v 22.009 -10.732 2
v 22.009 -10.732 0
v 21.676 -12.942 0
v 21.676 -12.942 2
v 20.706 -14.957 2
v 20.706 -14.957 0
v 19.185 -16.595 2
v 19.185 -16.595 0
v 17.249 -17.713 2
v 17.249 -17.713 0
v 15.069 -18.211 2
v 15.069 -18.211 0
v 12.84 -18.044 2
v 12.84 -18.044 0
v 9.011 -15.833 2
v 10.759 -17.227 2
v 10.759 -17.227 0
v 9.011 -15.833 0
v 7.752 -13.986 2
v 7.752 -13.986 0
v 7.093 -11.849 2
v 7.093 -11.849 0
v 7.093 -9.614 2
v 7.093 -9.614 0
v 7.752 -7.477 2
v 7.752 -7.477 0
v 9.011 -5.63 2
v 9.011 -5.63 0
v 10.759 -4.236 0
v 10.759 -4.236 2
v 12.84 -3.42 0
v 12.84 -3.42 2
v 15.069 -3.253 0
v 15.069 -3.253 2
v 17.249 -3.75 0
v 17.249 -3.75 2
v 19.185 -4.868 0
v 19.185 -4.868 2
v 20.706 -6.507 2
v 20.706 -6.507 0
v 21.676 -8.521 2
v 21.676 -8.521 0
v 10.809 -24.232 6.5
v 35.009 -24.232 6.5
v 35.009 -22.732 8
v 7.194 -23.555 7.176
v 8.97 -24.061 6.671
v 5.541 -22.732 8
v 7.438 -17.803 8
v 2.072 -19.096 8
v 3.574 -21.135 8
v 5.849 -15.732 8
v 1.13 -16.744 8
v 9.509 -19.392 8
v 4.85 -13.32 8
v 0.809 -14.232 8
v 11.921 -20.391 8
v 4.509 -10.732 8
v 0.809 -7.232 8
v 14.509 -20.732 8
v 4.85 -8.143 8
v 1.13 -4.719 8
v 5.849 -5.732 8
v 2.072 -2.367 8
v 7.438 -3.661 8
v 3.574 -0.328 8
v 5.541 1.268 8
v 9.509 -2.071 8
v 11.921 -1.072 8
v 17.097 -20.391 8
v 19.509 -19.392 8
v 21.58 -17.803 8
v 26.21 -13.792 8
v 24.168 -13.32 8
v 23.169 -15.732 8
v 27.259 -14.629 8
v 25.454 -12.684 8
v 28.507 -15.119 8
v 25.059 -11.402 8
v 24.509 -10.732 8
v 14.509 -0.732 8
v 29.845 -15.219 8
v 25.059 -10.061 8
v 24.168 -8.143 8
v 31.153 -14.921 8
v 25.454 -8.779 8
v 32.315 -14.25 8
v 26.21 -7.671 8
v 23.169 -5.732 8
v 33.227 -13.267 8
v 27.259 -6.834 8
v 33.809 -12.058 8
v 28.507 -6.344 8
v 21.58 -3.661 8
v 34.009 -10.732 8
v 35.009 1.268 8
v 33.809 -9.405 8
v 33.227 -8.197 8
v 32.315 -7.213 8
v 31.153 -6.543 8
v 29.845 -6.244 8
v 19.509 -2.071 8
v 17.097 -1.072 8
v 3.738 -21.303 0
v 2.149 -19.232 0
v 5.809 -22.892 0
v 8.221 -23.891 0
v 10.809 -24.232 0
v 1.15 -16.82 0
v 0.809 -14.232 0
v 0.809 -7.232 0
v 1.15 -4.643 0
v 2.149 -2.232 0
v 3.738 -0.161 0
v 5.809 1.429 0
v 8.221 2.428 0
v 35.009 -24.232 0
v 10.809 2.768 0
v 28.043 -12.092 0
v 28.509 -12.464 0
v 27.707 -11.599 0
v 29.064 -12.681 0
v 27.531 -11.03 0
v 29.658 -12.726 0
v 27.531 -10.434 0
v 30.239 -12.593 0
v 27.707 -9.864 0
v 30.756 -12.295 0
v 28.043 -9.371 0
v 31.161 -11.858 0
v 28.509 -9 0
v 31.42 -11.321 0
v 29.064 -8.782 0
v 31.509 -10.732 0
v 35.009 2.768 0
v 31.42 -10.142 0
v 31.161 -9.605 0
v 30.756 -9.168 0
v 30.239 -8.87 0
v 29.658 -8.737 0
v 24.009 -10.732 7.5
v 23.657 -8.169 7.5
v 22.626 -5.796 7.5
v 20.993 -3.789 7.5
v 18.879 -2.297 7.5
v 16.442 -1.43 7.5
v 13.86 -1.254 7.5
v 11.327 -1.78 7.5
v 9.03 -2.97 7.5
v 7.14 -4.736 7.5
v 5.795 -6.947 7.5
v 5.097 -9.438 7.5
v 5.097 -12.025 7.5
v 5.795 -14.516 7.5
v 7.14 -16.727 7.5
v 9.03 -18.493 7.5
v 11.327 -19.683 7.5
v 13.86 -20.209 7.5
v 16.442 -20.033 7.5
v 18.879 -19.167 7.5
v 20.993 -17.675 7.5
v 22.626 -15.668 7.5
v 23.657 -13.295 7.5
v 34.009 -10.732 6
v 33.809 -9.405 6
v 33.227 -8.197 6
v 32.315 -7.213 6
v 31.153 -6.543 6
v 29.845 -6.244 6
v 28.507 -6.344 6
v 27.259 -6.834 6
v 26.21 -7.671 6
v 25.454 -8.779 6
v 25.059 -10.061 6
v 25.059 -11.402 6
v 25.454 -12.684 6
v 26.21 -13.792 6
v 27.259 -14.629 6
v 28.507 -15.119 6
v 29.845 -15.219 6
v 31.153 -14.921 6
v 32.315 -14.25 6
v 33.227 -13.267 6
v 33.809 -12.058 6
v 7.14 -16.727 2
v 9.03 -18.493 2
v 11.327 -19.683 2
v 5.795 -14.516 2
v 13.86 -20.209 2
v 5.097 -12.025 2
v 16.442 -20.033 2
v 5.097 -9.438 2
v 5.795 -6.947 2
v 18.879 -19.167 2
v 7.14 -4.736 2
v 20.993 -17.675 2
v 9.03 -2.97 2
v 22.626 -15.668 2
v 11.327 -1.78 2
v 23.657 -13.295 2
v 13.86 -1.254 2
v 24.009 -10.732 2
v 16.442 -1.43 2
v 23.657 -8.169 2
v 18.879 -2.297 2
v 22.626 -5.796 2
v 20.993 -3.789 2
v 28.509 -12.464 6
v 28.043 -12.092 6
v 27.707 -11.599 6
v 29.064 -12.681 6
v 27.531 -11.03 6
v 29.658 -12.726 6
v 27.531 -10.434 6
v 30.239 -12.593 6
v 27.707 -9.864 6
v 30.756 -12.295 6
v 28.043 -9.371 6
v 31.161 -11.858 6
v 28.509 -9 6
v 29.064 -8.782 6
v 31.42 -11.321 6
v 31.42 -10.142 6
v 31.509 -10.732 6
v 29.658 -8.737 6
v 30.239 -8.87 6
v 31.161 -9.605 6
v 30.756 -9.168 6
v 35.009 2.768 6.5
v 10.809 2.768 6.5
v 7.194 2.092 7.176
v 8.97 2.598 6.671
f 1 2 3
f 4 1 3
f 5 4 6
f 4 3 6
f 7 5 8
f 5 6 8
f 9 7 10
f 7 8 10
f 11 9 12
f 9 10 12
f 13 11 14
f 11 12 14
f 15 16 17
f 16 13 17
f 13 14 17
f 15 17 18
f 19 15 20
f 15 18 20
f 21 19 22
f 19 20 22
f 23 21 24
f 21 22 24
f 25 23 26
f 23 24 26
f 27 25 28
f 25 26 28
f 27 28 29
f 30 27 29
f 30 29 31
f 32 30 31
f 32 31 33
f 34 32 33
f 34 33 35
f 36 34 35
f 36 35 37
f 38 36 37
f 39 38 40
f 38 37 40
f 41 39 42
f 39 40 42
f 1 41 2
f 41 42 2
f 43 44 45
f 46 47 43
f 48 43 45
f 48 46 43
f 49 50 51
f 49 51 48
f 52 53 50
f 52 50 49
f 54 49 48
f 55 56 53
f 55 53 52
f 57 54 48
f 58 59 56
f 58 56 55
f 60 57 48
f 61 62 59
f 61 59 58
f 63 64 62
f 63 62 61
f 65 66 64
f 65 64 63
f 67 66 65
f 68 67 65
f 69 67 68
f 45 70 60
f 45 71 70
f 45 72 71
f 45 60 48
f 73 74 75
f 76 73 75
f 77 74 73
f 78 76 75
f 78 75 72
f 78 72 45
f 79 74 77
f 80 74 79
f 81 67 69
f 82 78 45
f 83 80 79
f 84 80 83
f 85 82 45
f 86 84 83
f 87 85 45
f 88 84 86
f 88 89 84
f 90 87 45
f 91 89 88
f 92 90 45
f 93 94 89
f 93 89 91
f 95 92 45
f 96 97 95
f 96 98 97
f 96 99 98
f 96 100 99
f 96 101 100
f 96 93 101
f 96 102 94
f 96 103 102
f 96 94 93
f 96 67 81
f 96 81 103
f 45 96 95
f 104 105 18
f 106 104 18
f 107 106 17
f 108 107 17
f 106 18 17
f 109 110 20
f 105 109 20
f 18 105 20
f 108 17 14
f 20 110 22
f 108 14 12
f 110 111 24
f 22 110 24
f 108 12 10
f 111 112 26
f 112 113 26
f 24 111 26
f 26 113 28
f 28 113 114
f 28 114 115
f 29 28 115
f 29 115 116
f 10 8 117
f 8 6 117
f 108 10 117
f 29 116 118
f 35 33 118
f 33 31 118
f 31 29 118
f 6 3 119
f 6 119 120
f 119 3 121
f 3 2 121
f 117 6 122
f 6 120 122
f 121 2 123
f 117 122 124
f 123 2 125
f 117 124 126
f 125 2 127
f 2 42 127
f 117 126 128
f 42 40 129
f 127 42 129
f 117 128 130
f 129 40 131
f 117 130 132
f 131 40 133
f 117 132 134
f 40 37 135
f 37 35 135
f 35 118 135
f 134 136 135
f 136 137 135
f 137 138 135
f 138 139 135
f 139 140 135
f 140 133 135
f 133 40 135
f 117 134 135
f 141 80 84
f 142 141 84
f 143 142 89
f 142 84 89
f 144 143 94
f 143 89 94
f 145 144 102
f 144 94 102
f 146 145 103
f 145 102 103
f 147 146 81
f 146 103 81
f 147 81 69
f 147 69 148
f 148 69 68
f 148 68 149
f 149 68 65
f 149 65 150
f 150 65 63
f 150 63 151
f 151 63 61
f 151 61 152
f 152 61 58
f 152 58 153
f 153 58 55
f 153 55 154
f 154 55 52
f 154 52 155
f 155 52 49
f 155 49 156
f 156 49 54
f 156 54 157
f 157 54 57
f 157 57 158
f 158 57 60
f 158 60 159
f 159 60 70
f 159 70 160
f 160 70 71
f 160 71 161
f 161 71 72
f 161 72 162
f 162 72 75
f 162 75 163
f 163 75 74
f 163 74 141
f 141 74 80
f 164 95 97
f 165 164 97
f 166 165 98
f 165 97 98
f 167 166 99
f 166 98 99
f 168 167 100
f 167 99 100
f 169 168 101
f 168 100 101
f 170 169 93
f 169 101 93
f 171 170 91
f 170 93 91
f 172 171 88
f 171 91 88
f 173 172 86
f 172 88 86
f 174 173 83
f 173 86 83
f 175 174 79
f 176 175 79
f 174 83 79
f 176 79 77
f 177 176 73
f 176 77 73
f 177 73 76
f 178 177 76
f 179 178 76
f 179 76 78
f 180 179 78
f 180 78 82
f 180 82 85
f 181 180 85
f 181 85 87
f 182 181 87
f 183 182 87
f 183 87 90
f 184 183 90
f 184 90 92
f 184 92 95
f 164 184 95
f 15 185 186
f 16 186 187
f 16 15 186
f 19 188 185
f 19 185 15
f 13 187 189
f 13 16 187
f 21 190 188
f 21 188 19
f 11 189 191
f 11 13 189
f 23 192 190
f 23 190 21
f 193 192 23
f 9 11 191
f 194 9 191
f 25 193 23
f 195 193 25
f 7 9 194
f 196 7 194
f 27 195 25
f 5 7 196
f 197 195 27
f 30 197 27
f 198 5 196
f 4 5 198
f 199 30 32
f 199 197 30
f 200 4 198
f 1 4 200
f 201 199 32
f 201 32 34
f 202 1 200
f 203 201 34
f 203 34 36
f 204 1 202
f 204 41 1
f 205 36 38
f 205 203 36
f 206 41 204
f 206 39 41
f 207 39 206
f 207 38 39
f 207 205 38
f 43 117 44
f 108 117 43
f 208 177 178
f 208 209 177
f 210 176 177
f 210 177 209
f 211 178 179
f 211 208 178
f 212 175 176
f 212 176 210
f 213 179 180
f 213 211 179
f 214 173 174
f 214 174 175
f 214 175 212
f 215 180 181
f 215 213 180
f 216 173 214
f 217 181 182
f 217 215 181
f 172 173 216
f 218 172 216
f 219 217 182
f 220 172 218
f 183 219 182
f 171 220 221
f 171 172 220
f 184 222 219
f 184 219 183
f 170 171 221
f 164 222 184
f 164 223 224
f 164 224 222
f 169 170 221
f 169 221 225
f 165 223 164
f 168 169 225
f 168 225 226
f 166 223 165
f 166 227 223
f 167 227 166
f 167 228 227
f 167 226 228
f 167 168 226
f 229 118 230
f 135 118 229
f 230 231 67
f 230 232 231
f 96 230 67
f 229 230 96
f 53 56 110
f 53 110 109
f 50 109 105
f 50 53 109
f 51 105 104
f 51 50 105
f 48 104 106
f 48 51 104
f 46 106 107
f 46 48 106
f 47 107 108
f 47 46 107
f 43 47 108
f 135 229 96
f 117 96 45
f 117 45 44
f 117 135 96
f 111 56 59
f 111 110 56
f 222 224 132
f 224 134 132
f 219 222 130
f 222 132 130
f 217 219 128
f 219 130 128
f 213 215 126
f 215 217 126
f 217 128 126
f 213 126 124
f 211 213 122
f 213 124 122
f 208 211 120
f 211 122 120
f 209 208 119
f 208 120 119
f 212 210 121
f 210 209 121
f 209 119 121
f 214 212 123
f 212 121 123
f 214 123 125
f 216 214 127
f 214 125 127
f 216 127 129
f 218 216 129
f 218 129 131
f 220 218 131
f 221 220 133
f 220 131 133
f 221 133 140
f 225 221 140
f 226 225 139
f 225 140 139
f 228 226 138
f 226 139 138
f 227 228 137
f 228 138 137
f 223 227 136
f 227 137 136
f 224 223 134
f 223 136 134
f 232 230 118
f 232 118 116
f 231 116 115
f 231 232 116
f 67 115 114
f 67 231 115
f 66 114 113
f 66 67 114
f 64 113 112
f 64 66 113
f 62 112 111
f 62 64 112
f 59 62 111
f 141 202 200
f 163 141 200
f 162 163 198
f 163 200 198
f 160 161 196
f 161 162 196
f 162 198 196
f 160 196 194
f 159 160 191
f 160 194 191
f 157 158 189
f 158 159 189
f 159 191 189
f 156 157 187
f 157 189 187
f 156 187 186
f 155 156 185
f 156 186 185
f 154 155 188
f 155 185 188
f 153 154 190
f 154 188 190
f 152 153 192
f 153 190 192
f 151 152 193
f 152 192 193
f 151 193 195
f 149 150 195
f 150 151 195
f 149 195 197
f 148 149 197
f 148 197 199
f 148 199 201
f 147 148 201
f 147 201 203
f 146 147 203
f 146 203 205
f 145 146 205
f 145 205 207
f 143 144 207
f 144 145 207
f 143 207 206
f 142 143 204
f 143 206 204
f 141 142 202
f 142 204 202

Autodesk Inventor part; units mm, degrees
ref_plane "YZ Plane" through (0, 0, 0) normal (1, 0, 0) x (0, 1, 0)
ref_plane "XZ Plane" through (0, 0, 0) normal (0, 1, 0) x (-1, 0, 0)
ref_plane "XY Plane" through (0, 0, 0) normal (0, 0, 1) x (1, 0, 0)
sketch "Szkic1" plane through (0, 0, 0) normal (0, 0, 1) x (1, 0, 0)
  line L0 (0.8088, 2.7684) -> (35.0088, 2.7684)
  line L1 (35.0088, 2.7684) -> (35.0088, -24.2316)
  line L2 (35.0088, -24.2316) -> (0.8088, -24.2316)
  line L3 (0.8088, -24.2316) -> (0.8088, 2.7684)
  circle A0 centre (14.5088, -10.7316) radius 9.5
  circle A1 centre (29.5088, -10.7316) radius 2
  circle A2 centre (14.5088, -10.7316) radius 7.5
  point P0 (0, 0)
  dimension "d0" = 34.2
  dimension "d1" = 27
  dimension "d2" = 13.5
  dimension "d3" = 20.5
  dimension "d4" = 19
  dimension "d5" = 13.5
  dimension "d7" = 4
  dimension "d11" = 5.5
  dimension "d14" = 13.5
  dimension "d15" = 2
extrude "Wyciągnięcie proste1" add sketch "Szkic1" along normal blind 8 contours L0 L1 L2 L3
extrude "Wyciągnięcie proste2" add sketch "Szkic1" along normal blind 2 contours A0
chamfer "Faza1" distance 0.5 angle 45 1 edges at (5.0088, -10.7316, 8)
chamfer "Faza2" distance 1.5 angle 45 2 edges at (17.9088, 2.7684, 8) (17.9088, -24.2316, 8)
sketch "Szkic2" plane through (0, 0, 8) normal (0, 0, 1) x (1, 0, 0)
  circle A0 centre (29.5088, -10.7316) radius 2 projected
  circle A1 centre (29.5088, -10.7316) radius 4.5
  point P0 (0, 0)
  dimension "d30" = 9
extrude "Wyciągnięcie proste5" cut sketch "Szkic2" against normal blind 2
fillet "Zaokrąglenie1" radius 10 2 edges at (0.8088, -24.2316, 3.25) (0.8088, 2.7684, 3.25)
properties part number "3DP_ABS_Y_Axis_Pulley_Rod_Side_Bearing_Block"
